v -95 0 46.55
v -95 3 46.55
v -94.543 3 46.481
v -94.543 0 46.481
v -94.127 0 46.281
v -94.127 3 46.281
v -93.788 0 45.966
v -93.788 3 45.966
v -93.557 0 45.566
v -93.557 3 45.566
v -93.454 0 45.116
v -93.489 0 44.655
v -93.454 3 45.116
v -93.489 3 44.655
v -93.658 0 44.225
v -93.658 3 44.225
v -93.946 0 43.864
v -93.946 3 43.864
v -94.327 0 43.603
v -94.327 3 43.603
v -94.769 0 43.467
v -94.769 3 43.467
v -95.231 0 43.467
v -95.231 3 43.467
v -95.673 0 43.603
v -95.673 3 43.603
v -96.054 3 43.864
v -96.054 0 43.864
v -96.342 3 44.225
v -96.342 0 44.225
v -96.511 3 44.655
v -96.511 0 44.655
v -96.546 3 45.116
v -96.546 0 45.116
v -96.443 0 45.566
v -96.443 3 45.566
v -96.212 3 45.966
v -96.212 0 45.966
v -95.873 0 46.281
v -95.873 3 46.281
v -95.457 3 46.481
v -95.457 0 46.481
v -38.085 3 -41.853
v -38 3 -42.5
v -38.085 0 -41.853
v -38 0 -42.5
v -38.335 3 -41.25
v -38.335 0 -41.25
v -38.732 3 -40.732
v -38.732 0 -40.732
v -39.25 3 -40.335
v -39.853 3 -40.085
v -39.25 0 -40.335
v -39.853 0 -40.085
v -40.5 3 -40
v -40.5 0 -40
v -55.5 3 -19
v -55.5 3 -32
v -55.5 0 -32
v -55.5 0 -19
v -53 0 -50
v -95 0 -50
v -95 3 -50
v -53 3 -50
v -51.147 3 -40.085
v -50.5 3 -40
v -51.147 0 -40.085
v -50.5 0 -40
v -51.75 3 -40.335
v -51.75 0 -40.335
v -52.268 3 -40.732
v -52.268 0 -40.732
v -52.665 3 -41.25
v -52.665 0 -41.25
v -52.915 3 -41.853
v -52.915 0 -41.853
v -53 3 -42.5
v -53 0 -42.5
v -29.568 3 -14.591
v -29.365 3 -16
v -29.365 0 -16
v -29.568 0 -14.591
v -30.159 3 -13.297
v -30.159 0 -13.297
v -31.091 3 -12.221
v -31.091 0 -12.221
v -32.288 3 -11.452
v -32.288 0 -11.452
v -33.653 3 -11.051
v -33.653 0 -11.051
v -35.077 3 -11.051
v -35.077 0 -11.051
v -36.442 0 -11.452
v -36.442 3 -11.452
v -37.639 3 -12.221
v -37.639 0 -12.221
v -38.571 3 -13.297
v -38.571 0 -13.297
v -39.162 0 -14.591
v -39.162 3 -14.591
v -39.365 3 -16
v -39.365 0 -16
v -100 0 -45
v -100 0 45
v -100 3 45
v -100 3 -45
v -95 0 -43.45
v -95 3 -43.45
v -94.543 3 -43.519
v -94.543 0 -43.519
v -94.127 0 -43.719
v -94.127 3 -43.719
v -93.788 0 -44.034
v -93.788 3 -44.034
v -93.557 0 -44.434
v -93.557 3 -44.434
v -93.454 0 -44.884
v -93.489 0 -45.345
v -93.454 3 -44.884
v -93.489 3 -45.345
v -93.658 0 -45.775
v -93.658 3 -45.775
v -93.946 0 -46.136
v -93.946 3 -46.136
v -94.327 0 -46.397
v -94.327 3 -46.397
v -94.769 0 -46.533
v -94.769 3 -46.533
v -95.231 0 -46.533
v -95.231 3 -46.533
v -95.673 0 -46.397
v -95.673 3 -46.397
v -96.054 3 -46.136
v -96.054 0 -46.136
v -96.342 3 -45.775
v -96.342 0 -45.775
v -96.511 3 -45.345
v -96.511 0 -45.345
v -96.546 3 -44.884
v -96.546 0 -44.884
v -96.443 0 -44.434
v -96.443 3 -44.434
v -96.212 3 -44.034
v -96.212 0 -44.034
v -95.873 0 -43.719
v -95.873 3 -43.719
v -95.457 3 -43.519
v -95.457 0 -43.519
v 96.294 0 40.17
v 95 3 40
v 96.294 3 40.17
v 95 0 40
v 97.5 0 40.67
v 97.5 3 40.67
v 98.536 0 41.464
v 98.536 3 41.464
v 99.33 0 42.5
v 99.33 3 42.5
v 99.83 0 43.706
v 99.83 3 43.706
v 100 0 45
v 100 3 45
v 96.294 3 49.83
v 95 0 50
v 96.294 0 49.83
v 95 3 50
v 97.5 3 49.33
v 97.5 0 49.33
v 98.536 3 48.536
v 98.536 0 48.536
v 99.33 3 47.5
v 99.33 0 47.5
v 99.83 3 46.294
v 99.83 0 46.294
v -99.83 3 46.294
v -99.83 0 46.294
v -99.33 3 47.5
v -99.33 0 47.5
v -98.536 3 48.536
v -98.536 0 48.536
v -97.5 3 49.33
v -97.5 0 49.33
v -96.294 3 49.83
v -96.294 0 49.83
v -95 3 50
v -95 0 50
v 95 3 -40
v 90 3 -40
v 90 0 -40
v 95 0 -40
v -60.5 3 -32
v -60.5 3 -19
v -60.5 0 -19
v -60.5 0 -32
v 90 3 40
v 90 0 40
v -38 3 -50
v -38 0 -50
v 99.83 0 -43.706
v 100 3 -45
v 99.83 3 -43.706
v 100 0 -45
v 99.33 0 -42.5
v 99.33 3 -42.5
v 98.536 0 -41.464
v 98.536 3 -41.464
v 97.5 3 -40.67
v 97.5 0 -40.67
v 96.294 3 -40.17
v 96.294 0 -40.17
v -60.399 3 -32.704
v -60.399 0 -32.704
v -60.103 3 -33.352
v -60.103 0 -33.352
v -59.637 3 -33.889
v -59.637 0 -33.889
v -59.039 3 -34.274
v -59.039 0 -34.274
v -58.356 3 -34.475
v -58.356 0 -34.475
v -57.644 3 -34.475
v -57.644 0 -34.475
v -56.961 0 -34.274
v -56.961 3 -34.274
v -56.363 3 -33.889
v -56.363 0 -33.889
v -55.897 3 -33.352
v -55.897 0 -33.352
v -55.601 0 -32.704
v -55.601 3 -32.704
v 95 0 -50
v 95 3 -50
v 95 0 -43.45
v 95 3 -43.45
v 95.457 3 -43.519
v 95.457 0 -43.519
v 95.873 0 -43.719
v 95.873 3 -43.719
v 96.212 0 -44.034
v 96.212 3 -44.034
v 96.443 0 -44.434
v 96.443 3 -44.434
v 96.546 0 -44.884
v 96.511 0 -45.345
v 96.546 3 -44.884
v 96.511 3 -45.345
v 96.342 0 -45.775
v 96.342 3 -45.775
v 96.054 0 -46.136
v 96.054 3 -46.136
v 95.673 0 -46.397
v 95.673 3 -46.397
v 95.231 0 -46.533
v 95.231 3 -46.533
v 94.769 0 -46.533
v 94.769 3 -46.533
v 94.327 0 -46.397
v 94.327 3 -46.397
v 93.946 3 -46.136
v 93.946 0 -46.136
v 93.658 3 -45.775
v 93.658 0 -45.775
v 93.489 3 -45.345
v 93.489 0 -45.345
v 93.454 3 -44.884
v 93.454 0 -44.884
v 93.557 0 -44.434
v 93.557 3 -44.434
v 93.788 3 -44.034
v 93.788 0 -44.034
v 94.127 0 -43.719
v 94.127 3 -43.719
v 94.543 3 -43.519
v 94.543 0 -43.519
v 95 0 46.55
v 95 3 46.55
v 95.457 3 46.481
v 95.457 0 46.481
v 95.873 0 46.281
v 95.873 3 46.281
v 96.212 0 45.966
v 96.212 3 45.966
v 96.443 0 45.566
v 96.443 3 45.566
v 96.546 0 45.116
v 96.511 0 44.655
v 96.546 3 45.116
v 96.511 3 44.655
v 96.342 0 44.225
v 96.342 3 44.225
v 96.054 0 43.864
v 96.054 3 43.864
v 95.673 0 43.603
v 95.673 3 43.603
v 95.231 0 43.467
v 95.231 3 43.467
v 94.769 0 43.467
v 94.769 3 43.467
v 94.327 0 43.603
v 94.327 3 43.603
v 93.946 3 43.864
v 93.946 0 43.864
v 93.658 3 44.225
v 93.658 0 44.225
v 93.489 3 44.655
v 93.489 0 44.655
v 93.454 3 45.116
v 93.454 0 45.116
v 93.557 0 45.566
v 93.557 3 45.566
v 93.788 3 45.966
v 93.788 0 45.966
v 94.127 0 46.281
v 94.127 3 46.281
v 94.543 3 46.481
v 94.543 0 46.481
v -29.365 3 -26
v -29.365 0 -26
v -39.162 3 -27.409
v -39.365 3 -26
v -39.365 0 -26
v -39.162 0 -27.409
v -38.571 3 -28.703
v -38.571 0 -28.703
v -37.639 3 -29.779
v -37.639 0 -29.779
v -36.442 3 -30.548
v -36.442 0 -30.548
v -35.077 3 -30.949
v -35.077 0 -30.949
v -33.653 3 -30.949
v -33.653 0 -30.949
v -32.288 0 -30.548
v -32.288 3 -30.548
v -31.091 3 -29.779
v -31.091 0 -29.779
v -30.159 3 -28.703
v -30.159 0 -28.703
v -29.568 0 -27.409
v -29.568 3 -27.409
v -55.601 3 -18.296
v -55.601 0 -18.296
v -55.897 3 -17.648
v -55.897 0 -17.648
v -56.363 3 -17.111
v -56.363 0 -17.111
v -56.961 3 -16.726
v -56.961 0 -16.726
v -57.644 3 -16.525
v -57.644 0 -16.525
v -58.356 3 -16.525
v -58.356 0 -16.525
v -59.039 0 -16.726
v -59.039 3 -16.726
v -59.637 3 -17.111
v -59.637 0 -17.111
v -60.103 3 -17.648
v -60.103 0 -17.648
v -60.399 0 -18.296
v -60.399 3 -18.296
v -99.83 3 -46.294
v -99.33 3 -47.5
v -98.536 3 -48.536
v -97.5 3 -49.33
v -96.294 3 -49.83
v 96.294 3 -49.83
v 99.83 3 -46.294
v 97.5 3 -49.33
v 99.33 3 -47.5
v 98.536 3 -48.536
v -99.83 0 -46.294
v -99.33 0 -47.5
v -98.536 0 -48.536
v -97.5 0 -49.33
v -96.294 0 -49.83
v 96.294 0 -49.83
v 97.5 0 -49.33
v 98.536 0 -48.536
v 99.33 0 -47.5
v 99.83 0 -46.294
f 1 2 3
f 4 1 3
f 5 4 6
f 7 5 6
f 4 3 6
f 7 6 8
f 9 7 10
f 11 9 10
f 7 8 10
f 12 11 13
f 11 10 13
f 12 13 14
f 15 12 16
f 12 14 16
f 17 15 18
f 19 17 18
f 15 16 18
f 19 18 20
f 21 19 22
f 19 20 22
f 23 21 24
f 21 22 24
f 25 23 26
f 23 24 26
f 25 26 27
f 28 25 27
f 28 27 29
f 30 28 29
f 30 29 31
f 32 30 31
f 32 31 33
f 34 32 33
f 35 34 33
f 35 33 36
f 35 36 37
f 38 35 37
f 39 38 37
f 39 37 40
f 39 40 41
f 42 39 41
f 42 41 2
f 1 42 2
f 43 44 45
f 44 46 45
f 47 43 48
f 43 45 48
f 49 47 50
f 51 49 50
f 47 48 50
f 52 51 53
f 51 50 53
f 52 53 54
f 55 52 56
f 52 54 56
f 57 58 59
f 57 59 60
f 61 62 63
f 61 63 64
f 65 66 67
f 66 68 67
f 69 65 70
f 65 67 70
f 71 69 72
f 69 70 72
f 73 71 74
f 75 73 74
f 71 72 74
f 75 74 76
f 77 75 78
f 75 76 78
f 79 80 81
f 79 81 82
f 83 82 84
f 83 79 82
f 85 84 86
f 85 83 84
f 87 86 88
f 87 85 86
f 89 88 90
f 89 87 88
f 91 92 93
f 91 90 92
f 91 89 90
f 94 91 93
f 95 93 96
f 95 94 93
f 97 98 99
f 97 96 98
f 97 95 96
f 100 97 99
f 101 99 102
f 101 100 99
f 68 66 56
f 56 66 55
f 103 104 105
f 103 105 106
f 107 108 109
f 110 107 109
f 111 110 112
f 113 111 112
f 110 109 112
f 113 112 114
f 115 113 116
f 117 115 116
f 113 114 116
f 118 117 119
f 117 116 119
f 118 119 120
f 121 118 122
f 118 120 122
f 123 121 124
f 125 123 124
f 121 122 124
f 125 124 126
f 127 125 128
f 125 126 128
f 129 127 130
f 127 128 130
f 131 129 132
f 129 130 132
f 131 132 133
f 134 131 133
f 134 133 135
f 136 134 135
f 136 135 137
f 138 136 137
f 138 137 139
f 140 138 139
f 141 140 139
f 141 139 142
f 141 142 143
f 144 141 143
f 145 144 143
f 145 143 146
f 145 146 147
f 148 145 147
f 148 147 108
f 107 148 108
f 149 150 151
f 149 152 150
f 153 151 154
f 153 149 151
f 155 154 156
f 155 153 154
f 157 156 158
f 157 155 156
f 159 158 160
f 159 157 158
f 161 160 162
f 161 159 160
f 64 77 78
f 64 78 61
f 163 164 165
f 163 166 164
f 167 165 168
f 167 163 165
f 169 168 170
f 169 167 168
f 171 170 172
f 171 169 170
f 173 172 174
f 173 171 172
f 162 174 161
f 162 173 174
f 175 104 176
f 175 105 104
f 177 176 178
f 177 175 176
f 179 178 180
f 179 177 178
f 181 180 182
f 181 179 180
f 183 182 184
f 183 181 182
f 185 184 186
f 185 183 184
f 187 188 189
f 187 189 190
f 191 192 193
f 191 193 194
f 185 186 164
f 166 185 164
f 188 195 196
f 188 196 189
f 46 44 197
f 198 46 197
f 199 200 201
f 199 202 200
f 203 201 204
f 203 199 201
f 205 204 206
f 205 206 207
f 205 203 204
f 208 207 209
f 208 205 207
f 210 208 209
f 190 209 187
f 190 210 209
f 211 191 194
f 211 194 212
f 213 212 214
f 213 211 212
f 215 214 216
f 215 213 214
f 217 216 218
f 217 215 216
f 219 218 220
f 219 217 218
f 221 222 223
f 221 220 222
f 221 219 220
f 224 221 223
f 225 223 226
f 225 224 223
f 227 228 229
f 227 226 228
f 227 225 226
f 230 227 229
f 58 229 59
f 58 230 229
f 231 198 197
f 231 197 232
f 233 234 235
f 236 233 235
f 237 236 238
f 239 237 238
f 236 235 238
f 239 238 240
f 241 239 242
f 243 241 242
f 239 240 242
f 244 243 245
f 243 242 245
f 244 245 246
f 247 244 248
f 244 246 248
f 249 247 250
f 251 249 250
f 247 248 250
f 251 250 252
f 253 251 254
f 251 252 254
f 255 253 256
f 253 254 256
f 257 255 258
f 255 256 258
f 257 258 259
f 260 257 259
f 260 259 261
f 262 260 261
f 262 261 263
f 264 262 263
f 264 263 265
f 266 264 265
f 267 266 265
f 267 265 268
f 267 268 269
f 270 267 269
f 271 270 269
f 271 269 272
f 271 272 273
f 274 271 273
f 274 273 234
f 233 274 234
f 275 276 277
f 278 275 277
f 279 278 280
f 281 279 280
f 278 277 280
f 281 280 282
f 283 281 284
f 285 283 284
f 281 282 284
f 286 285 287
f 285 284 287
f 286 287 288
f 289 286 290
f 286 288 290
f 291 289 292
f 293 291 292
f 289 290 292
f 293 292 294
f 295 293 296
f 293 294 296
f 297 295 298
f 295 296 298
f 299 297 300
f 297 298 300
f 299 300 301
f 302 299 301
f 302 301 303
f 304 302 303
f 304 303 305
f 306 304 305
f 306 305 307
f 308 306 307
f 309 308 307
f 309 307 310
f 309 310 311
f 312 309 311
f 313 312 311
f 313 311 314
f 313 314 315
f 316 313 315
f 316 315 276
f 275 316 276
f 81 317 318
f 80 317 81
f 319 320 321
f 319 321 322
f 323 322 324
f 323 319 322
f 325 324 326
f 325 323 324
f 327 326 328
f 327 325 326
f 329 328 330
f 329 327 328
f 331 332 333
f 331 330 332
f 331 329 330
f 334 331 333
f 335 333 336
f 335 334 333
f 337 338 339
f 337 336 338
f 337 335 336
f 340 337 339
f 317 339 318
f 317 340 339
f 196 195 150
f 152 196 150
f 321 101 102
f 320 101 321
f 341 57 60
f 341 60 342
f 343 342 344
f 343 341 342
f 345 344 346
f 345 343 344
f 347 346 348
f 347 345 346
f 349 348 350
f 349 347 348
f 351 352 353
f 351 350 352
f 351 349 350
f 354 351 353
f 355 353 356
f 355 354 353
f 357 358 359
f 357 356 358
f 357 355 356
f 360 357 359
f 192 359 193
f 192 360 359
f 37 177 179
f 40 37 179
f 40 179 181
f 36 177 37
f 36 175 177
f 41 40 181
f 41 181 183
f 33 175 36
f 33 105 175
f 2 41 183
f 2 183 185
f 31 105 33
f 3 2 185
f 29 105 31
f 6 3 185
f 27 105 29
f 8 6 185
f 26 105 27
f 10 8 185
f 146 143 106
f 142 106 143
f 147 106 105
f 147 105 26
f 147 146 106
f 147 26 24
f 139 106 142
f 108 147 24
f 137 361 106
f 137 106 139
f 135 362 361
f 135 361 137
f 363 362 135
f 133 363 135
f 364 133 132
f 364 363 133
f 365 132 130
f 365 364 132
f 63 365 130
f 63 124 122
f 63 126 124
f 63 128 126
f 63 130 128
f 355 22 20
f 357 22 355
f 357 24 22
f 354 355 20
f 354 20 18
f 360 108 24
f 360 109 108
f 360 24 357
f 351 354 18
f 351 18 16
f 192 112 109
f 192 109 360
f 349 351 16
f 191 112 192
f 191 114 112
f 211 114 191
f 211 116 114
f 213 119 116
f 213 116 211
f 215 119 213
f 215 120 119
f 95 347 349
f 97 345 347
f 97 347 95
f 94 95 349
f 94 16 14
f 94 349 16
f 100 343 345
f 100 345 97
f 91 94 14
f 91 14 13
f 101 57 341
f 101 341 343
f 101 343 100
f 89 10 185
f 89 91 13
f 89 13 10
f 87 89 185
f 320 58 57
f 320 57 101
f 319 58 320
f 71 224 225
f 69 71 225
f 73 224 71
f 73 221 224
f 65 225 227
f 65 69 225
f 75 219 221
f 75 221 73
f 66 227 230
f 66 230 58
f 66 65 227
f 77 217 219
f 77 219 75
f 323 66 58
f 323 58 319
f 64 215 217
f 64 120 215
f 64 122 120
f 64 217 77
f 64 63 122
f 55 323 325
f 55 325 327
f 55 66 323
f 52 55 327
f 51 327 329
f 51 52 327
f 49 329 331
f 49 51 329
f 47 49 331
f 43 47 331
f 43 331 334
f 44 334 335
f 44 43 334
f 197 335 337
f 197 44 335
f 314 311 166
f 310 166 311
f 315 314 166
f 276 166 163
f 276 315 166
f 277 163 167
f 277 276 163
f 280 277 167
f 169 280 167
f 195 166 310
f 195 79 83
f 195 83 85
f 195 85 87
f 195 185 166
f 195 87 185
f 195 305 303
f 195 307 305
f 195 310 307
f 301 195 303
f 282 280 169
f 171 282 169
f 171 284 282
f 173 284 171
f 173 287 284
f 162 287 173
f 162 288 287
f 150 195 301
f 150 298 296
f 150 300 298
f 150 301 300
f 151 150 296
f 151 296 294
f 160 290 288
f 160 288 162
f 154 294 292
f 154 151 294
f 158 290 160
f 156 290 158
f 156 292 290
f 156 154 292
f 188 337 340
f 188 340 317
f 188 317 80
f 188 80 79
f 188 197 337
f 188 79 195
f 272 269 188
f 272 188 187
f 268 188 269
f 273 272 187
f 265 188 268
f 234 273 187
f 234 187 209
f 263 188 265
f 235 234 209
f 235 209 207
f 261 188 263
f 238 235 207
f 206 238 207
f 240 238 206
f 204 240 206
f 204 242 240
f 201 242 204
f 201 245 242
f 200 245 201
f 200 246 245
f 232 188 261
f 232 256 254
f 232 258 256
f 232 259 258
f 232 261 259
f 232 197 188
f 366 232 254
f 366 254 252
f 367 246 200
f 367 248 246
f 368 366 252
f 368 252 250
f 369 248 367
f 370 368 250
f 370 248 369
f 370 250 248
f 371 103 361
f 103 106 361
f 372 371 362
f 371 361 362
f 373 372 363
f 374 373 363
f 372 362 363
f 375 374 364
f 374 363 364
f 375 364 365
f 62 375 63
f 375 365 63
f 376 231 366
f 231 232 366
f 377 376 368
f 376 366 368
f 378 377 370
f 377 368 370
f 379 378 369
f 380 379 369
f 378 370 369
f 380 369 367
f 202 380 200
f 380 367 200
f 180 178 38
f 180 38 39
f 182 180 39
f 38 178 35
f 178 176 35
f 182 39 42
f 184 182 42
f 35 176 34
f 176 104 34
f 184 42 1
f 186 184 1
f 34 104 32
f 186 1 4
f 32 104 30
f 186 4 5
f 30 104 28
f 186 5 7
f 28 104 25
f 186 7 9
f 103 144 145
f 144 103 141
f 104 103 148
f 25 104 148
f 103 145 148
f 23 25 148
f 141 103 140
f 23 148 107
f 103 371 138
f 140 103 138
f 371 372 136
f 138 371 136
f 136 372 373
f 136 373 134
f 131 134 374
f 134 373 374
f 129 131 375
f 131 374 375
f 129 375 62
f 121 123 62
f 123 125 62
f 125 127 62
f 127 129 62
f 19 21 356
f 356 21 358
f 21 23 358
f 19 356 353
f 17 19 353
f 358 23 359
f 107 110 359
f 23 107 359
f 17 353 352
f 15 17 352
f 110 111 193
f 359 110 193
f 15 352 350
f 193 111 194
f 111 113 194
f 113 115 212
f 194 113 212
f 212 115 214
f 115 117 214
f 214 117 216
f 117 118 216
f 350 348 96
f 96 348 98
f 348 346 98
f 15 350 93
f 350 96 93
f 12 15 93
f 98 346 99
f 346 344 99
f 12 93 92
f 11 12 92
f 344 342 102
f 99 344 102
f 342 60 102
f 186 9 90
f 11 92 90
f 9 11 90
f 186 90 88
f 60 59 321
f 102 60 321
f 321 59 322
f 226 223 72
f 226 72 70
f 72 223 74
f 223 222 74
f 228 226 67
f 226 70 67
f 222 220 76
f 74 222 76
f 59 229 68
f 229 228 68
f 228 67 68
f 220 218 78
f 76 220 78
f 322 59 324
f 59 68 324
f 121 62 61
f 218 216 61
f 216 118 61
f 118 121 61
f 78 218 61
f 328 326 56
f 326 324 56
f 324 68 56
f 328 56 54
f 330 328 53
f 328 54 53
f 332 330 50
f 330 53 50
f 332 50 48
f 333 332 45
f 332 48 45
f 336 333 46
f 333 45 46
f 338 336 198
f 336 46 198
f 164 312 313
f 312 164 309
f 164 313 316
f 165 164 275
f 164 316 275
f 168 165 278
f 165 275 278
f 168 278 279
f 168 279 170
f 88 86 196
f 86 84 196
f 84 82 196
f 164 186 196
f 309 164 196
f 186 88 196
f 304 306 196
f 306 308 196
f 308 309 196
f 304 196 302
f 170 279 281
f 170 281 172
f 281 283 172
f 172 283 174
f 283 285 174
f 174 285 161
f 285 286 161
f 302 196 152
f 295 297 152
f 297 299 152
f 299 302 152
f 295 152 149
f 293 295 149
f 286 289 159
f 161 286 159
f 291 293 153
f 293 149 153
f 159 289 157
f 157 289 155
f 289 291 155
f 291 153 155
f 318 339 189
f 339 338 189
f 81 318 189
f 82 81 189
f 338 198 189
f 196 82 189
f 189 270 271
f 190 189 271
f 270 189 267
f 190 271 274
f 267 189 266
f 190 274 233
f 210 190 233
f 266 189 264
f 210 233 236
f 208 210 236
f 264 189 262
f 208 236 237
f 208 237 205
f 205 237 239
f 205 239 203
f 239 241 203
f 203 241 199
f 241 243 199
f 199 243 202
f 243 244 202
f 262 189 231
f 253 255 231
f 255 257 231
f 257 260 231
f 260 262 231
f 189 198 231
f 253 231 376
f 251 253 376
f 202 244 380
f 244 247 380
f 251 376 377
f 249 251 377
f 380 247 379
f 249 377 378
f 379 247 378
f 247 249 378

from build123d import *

# Parameters (mm, degrees)
SKETCH1_W           = 200
SKETCH1_H           = 100
BOSS_EXTRUDE1_DEPTH = 3
SKETCH2_R           = 1.55
CUT_EXTRUDE1_DEPTH  = 112.843640856
FILLET1_R           = 5
SKETCH3_W           = 10
SKETCH3_H           = 80
SKETCH3_W_2         = 15
SKETCH3_H_2         = 10
CUT_EXTRUDE2_DEPTH  = 112.843640856
FILLET2_R           = 5
FILLET4_R           = 2.5


with BuildPart() as part:
    # Sketch1 → Boss-Extrude1 (new body)
    with BuildSketch(Plane(origin=(0, 0, 0), x_dir=(1, 0, 0), z_dir=(0, 1, 0))):
        Rectangle(SKETCH1_W, SKETCH1_H)
    extrude(amount=BOSS_EXTRUDE1_DEPTH)

    # Sketch2 → Cut-Extrude1 (cut, through all)
    with BuildSketch(Plane(origin=(0, 3, 0), x_dir=(1, 0, 0), z_dir=(0, 1, 0))):
        with Locations(Location((-95, 45, 0), (0, 0, 270))):
            Circle(SKETCH2_R)
        with Locations(Location((-95, -45, 0), (0, 0, 270))):
            Circle(SKETCH2_R)
        with Locations(Location((95, 45, 0), (0, 0, 270))):
            Circle(SKETCH2_R)
        with Locations(Location((95, -45, 0), (0, 0, 270))):
            Circle(SKETCH2_R)
    extrude(amount=-CUT_EXTRUDE1_DEPTH, mode=Mode.SUBTRACT)

    # Fillet1
    fillet1_edges = [part.edges().sort_by_distance(p)[0] for p in [
        (-100, 1.5, -50),
        (100, 1.5, -50),
        (100, 1.5, 50),
        (-100, 1.5, 50),
    ]]
    fillet(fillet1_edges, radius=FILLET1_R)

    # Sketch3 → Cut-Extrude2 (cut, through all)
    with BuildSketch(Plane(origin=(0, 3, 0), x_dir=(1, 0, 0), z_dir=(0, 1, 0))):
        with Locations((95, 0)):
            Rectangle(SKETCH3_W, SKETCH3_H)
        with BuildLine():
            Line((-55.5, 32), (-55.5, 19))
            ThreePointArc((-55.5, 19), (-58, 16.5), (-60.5, 19))
            Line((-60.5, 19), (-60.5, 32))
            ThreePointArc((-60.5, 32), (-58, 34.5), (-55.5, 32))
        make_face()
        with BuildLine():
            Line((-29.365, 26), (-29.365, 16))
            ThreePointArc((-29.365, 16), (-34.365, 11), (-39.365, 16))
            Line((-39.365, 16), (-39.365, 26))
            ThreePointArc((-39.365, 26), (-34.365, 31), (-29.365, 26))
        make_face()
        with Locations((-45.5, 45)):
            Rectangle(SKETCH3_W_2, SKETCH3_H_2)
    extrude(amount=-CUT_EXTRUDE2_DEPTH, mode=Mode.SUBTRACT)

    # Fillet2
    fillet2_edges = [part.edges().sort_by_distance(p)[0] for p in [
        (100, 1.5, 40),
        (100, 1.5, -40),
    ]]
    fillet(fillet2_edges, radius=FILLET2_R - 0.0001)  # a hair under: the kernel refuses the full size

    # Fillet4
    fillet4_edges = [part.edges().sort_by_distance(p)[0] for p in [
        (-38, 1.5, -40),
        (-53, 1.5, -40),
    ]]
    fillet(fillet4_edges, radius=FILLET4_R)


solid = part.part
